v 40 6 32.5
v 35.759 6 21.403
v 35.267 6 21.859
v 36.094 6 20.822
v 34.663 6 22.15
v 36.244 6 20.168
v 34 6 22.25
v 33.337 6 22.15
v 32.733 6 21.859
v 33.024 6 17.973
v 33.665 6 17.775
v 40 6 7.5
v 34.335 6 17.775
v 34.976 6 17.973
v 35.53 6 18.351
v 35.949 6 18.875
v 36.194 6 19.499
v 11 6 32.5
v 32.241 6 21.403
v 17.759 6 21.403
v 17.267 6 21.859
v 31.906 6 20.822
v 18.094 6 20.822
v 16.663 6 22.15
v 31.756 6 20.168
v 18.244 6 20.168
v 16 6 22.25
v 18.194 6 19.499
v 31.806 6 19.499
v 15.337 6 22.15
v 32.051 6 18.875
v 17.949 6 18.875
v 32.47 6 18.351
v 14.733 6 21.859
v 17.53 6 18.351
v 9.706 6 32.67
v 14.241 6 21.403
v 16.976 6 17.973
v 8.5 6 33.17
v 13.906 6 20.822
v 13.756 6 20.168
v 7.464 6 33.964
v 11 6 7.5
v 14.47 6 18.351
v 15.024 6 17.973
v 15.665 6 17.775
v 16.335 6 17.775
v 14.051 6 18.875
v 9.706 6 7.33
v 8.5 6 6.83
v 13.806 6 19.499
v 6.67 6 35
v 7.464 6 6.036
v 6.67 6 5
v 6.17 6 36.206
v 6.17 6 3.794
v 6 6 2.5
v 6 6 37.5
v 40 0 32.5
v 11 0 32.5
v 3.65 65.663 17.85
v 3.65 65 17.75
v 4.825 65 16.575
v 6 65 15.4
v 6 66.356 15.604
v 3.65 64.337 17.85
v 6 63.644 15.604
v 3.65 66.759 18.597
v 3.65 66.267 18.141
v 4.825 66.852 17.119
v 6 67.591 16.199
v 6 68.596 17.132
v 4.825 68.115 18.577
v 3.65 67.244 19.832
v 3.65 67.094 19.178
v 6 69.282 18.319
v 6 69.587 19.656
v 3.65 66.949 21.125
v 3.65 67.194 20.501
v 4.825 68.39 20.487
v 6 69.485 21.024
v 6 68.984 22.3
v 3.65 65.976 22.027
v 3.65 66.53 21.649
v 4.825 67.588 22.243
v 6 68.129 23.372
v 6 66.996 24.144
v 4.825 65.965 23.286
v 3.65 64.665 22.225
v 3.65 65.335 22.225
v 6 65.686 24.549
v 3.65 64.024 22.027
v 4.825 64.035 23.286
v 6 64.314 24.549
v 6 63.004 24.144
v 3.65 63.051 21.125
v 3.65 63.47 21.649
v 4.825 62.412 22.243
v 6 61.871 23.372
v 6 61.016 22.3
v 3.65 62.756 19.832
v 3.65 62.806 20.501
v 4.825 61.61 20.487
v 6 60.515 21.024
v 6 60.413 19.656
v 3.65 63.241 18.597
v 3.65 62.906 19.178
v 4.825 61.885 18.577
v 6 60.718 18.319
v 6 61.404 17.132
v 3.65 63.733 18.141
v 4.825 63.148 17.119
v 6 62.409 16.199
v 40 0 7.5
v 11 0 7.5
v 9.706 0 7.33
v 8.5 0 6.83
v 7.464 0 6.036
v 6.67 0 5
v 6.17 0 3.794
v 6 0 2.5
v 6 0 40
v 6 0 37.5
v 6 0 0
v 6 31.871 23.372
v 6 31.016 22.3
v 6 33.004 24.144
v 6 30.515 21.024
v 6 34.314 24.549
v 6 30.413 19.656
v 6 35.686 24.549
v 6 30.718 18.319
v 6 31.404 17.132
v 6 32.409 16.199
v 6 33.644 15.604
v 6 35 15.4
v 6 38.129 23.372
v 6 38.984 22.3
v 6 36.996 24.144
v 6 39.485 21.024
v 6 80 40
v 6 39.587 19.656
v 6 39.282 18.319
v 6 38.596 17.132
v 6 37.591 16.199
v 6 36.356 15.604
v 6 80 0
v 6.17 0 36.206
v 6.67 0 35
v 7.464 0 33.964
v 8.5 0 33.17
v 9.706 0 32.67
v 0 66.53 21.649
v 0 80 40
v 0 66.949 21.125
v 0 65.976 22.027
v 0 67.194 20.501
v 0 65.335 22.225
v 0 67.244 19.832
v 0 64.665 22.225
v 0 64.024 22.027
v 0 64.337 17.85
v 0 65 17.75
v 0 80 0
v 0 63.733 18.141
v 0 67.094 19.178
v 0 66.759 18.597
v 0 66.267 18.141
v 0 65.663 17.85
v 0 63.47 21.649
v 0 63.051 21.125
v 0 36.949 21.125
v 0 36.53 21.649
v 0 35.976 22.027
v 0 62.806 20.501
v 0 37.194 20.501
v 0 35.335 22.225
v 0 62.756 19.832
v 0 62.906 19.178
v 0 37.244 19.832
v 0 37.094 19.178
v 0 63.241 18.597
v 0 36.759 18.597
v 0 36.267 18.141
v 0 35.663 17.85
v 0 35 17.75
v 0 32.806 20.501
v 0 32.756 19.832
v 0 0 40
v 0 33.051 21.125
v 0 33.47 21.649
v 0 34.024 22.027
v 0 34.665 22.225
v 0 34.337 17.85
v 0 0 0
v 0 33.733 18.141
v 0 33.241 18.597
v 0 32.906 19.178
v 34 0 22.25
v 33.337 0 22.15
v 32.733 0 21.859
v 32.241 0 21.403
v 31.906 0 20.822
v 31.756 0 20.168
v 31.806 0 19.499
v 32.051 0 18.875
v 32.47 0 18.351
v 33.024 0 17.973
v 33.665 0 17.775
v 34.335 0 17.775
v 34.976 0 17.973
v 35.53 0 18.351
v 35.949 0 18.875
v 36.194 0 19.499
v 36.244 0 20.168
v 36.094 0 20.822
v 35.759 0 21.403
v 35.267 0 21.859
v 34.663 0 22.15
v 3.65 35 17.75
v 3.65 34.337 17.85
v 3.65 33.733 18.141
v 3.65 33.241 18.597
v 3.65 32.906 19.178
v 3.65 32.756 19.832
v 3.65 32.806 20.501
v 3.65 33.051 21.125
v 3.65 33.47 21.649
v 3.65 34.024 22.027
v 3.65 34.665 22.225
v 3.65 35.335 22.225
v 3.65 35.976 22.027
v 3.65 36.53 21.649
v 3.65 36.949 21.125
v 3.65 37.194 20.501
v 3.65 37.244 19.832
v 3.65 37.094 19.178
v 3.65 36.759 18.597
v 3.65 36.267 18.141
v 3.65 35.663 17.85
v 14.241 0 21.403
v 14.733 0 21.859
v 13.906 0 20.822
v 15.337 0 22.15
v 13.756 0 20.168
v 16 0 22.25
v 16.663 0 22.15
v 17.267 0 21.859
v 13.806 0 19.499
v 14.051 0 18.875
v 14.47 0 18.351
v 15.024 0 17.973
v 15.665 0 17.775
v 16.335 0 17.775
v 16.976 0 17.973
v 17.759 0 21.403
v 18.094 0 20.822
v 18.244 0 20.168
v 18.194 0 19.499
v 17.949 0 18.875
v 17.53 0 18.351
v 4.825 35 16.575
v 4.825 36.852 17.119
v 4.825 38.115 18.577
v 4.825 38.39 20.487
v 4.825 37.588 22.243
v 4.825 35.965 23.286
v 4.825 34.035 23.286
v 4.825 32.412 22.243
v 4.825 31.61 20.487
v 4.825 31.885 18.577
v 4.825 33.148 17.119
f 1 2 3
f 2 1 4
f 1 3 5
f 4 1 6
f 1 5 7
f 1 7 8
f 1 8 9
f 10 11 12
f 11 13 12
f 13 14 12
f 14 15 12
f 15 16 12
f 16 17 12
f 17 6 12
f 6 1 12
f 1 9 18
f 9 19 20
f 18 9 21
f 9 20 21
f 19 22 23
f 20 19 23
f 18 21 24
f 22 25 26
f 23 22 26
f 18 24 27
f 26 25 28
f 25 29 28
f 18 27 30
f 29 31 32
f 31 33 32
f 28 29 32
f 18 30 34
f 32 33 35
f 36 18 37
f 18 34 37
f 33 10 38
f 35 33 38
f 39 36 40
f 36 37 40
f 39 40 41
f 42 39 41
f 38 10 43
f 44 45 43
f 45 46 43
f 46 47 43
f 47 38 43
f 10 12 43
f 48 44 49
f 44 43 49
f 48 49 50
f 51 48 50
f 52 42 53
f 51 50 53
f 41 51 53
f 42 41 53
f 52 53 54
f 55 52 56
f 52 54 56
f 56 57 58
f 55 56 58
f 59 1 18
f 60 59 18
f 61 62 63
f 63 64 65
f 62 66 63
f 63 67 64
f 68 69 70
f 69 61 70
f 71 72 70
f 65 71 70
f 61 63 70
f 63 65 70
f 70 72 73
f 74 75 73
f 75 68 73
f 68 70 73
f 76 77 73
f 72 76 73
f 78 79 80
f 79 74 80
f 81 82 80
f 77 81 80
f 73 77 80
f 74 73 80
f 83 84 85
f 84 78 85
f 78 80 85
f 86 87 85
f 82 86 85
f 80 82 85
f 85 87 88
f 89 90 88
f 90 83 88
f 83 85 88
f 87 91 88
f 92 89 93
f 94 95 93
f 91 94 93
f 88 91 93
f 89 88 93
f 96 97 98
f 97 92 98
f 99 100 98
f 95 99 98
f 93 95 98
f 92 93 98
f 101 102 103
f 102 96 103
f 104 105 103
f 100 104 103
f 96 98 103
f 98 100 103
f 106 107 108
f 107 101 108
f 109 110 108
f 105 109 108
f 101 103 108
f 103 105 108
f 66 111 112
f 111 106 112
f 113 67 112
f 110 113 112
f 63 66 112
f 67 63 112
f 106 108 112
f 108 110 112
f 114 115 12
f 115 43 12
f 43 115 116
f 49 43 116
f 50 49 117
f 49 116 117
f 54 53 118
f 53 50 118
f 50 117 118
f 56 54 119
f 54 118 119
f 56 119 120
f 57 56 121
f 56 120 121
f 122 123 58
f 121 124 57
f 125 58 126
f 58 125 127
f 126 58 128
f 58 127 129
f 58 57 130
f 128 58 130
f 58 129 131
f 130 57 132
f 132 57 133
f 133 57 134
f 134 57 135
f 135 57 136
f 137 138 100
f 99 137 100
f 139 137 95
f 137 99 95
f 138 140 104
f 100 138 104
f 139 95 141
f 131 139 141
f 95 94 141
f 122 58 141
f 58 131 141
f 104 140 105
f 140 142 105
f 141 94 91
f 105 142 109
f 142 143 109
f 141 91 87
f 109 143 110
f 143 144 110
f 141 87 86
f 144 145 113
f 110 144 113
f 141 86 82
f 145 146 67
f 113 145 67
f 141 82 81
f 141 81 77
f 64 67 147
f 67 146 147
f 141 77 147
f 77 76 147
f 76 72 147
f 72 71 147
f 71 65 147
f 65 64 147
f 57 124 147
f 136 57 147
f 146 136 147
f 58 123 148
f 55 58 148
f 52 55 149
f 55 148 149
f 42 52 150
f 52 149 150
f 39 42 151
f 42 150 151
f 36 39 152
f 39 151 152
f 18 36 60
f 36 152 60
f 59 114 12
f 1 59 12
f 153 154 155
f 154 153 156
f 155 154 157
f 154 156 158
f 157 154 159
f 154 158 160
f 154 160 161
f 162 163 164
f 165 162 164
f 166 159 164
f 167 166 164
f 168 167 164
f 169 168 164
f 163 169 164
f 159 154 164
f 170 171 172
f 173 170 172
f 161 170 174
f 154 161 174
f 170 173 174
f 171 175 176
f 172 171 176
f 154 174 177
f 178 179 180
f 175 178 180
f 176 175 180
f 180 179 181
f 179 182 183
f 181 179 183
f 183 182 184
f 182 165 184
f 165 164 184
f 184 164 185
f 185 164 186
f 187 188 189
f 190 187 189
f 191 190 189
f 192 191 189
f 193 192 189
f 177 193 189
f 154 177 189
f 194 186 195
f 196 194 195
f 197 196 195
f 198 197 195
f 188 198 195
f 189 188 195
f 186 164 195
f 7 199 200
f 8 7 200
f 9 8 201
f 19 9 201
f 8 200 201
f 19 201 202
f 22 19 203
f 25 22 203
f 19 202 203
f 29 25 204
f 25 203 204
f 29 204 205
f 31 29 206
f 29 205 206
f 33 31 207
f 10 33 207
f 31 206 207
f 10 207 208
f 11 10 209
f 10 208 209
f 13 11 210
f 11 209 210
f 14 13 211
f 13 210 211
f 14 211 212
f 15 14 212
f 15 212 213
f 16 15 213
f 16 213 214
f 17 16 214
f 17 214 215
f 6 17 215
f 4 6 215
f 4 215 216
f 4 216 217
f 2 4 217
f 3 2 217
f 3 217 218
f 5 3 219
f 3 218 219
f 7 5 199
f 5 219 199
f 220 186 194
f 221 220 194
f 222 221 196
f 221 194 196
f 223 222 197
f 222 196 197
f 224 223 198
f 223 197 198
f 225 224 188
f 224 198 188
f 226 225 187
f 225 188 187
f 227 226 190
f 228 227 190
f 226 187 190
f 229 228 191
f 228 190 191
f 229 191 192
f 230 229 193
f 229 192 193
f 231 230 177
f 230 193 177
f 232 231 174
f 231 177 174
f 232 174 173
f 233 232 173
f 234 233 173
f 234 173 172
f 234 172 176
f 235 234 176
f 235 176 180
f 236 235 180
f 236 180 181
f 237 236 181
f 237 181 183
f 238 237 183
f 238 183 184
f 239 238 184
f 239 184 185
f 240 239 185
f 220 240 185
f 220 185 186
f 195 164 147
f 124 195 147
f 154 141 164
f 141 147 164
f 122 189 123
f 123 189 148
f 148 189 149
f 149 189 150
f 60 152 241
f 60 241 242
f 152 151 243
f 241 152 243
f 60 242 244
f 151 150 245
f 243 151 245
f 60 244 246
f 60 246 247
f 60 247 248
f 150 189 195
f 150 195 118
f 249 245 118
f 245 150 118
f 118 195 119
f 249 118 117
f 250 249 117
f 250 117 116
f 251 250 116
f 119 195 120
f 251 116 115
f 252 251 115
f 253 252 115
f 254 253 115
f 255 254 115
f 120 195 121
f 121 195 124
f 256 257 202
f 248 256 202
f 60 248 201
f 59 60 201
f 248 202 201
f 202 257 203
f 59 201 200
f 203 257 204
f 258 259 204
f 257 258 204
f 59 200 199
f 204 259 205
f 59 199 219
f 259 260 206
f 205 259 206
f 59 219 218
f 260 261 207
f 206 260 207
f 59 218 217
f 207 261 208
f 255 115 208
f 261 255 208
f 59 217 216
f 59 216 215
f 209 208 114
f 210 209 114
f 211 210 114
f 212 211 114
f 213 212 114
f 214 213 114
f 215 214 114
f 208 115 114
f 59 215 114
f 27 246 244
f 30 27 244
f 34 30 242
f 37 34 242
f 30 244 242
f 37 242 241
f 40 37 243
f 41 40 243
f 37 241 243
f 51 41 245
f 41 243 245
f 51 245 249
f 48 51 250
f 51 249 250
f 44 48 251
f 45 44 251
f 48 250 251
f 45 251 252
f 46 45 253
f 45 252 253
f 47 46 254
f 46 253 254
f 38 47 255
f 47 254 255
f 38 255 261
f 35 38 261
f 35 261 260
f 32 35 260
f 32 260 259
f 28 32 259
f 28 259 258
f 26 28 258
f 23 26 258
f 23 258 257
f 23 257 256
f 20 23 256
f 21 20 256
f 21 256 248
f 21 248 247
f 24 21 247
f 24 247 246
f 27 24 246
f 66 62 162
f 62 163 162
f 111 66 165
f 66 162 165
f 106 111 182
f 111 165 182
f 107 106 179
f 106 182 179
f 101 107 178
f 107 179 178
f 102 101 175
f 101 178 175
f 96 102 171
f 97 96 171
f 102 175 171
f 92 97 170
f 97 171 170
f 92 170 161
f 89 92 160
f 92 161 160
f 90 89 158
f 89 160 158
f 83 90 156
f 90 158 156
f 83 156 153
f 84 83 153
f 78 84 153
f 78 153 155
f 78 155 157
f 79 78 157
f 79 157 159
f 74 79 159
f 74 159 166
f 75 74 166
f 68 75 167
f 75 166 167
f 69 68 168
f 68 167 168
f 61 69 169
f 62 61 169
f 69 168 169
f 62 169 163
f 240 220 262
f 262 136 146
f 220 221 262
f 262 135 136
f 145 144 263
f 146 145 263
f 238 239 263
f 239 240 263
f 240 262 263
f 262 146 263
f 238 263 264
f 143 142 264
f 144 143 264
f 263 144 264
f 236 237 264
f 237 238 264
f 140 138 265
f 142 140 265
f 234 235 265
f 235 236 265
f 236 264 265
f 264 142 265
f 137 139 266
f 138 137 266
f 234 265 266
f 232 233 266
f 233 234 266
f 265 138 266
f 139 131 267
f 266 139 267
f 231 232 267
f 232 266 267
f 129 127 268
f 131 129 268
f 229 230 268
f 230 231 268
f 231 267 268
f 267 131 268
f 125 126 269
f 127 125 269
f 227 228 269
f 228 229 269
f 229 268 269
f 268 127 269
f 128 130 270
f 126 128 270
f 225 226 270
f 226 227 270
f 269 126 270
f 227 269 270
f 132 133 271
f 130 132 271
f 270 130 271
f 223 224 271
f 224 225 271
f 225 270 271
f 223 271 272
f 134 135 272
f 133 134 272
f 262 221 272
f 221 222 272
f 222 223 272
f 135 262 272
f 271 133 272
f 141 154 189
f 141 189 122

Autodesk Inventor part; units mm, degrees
ref_plane "YZ Plane" through (0, 0, 0) normal (1, 0, 0) x (0, 1, 0)
ref_plane "XZ Plane" through (0, 0, 0) normal (0, 1, 0) x (-1, 0, 0)
ref_plane "XY Plane" through (0, 0, 0) normal (0, 0, 1) x (1, 0, 0)
sketch "Skizze1" plane through (0, 0, 0) normal (0, 0, 1) x (1, 0, 0)
  line L0 (0, 0) -> (2.7641, 0)
  line L1 (6, 6) -> (6, 80)
  line L2 (6, 80) -> (0, 80)
  line L3 (0, 80) -> (0, 0)
  line L4 (-8, 0) -> (48, 0) projected
  line L5 (0, -16) -> (0, 96) projected
  line L6 (0, 0) -> (40, 0)
  line L7 (40, 0) -> (40, 6)
  line L8 (40, 6) -> (6, 6)
  line L9 (0, 2.8256) -> (0, 0)
  dimension "d0" = 80
  dimension "d1" = 40
  dimension "d2" = 6
extrude "Extrusion1" add sketch "Skizze1" along normal blind 40
sketch "Skizze2" plane through (6, 6, 0) normal (0, 1, 0) x (1, 0, 0)
  line L0 (34, 0) -> (34, -40) projected
  line L1 (0, 0) -> (0, -40) projected
  line L2 (0, -20) -> (34, -20)
  line L3 (0, -7.5) -> (34, -7.5)
  line L4 (34, -7.5) -> (34, -32.5)
  line L5 (34, -32.5) -> (0, -32.5)
  line L6 (0, -32.5) -> (0, -7.5)
  line L7 (34, -7.5) -> (0, -7.5)
  line L8 (0, -7.5) -> (0, 0)
  line L9 (0, 0) -> (34, 0)
  line L10 (34, 0) -> (34, -7.5)
  line L11 (34, -40) -> (0, -40)
  line L12 (0, -40) -> (0, -32.5)
  line L13 (0, -32.5) -> (34, -32.5)
  line L14 (34, -32.5) -> (34, -40)
  point P0 (-6, 0)
  dimension "d5" = 25
extrude "Extrusion2" cut sketch "Skizze2" against normal through all contours L0 L3 L1 L9 | L0 L11 L1 L5
sketch "Skizze3" plane through (0, 0, 0) normal (-1, 0, 0) x (0, 0, 1)
  line L0 (0, 80) -> (40, 80) projected
  line L1 (0, 0) -> (40, 0) projected
  line L2 (20, 80) -> (20, 0)
  point P0 (20, 65)
  point P1 (20, 35)
  dimension "d8" = 15
  dimension "d9" = 30
hole "Bohrung1" at (0, 65, 20) at (0, 35, 20) direction (1, 0, 0) diameter 4 end through all
sketch "Skizze4" plane through (6, 6, 32.5) normal (0, 1, 0) x (1, 0, 0)
  line L0 (34, 25) -> (34, 0) projected
  line L1 (0, 25) -> (0, 0) projected
  line L2 (34, 12.5) -> (0, 12.5)
  point P0 (-6, 32.5)
  point P1 (28, 12.5)
  point P2 (10, 12.5)
  dimension "d17" = 18
  dimension "d44" = 6
hole "Bohrung2" at (34, 6, 20) at (16, 6, 20) direction (0, -1, 0) diameter 4.5 end through all
fillet "Rundung1" radius 5 2 edges at (6, 3, 32.5) (6, 3, 7.5)
sketch "Skizze5" plane through (6, 0, 0) normal (1, 0, 0) x (0, 0, -1)
  circle A0 centre (-20, 65) radius 2 projected
  circle A1 centre (-20, 35) radius 2 projected
hole "Bohrung5" at (6, 65, 20) at (6, 35, 20) direction (-1, 0, 0) diameter 4.5 end through all countersink diameter 9.2 countersink angle 90
properties part number "1_0204_003"
